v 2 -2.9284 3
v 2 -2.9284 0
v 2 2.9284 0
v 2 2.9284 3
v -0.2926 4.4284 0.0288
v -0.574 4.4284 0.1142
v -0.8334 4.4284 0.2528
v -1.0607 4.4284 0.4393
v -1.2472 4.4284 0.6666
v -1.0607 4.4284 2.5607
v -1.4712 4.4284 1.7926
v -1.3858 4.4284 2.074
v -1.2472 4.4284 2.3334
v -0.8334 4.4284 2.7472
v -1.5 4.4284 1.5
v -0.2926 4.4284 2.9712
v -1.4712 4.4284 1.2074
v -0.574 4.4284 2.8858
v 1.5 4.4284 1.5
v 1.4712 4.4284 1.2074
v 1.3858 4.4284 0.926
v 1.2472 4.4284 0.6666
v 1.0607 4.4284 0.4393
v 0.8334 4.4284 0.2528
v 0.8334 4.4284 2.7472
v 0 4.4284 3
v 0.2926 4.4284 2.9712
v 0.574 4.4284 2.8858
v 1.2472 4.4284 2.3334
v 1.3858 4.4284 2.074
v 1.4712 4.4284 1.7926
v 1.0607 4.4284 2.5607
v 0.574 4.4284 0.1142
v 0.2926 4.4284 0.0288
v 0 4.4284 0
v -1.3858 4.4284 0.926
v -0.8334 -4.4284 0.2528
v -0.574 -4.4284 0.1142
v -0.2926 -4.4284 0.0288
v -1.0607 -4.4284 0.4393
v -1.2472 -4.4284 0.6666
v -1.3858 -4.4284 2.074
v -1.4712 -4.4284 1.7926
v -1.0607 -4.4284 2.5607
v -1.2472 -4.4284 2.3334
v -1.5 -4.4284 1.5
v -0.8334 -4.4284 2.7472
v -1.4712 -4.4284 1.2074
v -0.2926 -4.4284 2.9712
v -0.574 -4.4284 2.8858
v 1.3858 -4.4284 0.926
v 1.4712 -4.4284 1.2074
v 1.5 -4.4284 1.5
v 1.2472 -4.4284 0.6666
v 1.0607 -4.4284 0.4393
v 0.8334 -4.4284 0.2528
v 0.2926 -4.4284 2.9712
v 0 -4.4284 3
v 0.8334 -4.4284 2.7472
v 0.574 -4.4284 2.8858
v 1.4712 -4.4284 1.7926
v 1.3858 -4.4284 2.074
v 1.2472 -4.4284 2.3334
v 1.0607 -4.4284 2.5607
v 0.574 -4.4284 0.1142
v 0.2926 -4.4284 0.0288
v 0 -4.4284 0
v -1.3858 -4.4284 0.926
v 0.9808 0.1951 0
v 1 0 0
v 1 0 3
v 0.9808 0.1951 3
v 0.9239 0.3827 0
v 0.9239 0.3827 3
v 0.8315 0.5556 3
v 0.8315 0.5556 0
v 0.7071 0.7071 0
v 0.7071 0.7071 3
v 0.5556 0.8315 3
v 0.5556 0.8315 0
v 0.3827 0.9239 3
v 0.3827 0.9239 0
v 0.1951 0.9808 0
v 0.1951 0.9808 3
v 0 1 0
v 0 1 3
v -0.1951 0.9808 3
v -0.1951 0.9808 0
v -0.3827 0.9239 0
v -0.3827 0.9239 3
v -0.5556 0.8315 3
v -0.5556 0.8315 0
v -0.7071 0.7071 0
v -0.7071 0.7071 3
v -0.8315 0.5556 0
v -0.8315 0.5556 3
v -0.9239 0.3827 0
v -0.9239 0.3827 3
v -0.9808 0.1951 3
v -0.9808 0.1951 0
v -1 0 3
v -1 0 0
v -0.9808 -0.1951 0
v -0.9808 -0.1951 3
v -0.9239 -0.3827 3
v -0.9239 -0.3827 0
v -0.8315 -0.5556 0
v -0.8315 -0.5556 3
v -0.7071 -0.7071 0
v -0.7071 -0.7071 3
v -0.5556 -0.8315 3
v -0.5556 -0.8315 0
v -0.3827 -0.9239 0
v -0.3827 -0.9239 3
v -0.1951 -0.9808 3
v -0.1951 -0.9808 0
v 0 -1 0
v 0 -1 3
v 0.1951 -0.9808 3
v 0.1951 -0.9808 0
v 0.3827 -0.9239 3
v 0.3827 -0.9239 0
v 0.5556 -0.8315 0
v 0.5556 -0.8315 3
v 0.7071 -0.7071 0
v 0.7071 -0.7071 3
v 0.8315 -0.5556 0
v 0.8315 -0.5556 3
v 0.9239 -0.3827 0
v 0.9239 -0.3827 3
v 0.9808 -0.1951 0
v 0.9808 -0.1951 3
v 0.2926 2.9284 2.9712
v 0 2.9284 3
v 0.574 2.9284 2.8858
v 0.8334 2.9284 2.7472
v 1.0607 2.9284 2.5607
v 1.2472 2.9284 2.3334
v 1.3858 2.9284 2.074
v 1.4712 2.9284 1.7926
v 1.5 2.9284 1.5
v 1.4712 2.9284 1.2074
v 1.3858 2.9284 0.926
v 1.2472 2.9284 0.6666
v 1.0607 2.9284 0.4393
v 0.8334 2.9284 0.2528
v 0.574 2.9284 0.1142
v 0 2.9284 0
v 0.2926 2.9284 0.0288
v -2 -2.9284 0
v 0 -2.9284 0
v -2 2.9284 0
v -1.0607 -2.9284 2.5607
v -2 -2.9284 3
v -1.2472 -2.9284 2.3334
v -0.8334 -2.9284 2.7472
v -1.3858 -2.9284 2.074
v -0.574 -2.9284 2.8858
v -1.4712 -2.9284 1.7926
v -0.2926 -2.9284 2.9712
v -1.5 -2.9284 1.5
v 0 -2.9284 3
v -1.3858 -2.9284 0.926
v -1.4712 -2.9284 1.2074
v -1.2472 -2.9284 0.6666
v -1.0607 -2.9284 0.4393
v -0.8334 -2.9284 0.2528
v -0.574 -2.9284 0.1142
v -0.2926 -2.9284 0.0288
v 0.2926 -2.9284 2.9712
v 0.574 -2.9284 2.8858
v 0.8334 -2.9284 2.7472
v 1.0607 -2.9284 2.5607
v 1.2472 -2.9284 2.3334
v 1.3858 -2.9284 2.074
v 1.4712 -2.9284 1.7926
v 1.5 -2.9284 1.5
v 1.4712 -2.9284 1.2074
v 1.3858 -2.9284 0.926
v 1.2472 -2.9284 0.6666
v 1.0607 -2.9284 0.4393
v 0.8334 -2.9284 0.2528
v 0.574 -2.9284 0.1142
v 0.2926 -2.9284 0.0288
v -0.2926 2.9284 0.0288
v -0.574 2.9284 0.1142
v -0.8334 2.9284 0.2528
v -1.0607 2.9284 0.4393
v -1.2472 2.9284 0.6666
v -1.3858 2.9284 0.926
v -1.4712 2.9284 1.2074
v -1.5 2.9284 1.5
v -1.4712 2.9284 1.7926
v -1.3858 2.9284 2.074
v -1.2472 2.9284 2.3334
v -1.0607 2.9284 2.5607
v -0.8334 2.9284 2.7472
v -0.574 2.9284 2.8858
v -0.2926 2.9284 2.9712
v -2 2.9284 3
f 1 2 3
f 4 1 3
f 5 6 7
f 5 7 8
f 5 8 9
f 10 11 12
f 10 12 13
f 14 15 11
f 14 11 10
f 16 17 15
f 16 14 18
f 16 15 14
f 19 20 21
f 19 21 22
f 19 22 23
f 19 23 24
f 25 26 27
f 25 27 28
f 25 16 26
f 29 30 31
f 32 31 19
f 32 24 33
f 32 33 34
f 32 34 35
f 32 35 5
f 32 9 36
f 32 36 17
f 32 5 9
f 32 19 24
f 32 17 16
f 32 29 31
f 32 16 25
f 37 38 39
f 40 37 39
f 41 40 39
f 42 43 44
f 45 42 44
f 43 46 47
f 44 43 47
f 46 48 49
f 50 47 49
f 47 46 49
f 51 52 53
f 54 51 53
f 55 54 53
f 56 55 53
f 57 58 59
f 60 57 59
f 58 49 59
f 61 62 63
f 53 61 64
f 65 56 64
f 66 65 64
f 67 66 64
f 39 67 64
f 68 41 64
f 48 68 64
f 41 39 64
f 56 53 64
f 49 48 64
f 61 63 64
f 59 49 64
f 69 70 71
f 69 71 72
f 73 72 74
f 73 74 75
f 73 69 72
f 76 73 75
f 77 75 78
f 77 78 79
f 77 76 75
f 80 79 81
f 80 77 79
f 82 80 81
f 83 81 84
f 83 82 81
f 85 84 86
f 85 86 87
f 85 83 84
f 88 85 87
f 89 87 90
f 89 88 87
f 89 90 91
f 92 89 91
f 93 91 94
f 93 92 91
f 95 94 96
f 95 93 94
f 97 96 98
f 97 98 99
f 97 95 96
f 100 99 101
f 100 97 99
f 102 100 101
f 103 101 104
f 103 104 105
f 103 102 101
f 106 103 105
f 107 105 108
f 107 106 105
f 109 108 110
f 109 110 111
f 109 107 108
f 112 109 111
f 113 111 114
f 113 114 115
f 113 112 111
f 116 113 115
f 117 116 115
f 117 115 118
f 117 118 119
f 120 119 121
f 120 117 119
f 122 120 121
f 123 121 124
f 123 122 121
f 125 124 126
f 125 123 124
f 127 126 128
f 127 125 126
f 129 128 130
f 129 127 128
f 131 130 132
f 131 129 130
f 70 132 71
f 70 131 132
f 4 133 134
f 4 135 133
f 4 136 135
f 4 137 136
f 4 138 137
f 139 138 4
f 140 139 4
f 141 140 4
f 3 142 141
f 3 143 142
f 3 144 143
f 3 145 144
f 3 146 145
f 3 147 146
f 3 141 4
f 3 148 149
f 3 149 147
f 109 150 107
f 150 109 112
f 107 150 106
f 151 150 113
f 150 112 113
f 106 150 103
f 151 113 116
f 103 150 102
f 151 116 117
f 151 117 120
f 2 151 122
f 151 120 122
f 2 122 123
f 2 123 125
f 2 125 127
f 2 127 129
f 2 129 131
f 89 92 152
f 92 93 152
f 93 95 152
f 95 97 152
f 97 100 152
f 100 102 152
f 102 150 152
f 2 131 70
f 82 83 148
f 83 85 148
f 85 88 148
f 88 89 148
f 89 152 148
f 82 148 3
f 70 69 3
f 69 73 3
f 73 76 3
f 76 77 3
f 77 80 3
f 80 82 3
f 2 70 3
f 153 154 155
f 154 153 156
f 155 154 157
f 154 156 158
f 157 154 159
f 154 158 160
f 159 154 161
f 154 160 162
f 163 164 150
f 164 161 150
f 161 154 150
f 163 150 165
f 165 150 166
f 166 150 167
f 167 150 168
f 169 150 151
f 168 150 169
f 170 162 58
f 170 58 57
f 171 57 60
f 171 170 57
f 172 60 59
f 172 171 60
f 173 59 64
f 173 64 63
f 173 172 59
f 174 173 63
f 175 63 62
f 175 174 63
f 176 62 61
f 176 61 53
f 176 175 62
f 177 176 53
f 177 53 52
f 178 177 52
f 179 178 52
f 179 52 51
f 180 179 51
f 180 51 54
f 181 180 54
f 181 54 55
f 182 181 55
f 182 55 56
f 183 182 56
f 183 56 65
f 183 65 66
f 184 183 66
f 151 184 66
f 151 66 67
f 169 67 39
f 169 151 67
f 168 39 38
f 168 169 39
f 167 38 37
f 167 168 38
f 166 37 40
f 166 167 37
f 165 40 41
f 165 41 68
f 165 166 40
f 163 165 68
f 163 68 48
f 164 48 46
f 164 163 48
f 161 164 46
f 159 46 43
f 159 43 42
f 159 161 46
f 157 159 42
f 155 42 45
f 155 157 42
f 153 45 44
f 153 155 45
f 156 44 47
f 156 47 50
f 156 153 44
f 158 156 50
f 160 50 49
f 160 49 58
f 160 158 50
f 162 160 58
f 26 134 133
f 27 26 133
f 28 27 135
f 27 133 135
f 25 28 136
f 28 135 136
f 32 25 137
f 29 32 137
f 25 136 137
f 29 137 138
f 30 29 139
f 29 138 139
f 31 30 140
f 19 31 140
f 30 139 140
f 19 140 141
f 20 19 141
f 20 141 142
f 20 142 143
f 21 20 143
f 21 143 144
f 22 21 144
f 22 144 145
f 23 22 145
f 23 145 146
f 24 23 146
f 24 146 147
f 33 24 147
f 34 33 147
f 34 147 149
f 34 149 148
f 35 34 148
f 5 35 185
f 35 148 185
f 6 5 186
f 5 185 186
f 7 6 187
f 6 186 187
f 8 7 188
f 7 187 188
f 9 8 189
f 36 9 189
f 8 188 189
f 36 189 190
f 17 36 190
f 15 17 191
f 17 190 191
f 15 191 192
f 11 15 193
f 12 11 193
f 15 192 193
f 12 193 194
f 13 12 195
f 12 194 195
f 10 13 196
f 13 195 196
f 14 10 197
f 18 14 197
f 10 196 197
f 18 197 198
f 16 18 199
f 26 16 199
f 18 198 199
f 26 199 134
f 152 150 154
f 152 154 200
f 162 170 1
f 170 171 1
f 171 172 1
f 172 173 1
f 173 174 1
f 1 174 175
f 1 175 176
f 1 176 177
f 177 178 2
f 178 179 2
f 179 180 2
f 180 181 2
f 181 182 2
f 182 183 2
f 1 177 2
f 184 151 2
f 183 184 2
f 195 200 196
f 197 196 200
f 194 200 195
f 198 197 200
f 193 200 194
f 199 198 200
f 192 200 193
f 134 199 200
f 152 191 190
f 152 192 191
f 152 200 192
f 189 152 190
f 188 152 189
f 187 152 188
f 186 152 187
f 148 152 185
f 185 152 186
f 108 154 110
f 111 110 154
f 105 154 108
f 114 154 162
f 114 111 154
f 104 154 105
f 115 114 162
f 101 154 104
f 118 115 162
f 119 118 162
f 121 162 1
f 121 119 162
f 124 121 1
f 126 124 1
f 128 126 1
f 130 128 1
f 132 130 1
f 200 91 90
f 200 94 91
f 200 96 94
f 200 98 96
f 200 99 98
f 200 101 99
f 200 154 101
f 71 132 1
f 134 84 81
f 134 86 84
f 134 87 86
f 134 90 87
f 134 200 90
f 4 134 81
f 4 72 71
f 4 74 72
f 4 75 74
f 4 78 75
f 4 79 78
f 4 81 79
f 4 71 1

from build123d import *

# Parameters (mm, degrees)
SKETCH_1_W      = 4
SKETCH_1_H      = 5.856888772
SKETCH_1_R      = 0.999999985
EXTRUDE_1_DEPTH = 3
SKETCH_2_R      = 1.5
EXTRUDE_2_DEPTH = 1.5


with BuildPart() as part:
    # 草图1 → 凸台-拉伸1 (new body)
    with BuildSketch(Plane.XY):
        Rectangle(SKETCH_1_W, SKETCH_1_H)
        Circle(SKETCH_1_R, mode=Mode.SUBTRACT)
    extrude(amount=EXTRUDE_1_DEPTH)

    # 草图2 → 凸台-拉伸2 (add)
    with BuildSketch(Plane(origin=(0, 2.928444386, 0), x_dir=(1, 0, 0), z_dir=(0, 1, 0))):
        with Locations(Location((0, -1.5, 0), (0, 0, 270))):
            Circle(SKETCH_2_R)
    extrude_2 = extrude(amount=EXTRUDE_2_DEPTH)

    # 镜向1: 凸台-拉伸2 across plane
    add(extrude_2.mirror(Plane.ZX))


solid = part.part
